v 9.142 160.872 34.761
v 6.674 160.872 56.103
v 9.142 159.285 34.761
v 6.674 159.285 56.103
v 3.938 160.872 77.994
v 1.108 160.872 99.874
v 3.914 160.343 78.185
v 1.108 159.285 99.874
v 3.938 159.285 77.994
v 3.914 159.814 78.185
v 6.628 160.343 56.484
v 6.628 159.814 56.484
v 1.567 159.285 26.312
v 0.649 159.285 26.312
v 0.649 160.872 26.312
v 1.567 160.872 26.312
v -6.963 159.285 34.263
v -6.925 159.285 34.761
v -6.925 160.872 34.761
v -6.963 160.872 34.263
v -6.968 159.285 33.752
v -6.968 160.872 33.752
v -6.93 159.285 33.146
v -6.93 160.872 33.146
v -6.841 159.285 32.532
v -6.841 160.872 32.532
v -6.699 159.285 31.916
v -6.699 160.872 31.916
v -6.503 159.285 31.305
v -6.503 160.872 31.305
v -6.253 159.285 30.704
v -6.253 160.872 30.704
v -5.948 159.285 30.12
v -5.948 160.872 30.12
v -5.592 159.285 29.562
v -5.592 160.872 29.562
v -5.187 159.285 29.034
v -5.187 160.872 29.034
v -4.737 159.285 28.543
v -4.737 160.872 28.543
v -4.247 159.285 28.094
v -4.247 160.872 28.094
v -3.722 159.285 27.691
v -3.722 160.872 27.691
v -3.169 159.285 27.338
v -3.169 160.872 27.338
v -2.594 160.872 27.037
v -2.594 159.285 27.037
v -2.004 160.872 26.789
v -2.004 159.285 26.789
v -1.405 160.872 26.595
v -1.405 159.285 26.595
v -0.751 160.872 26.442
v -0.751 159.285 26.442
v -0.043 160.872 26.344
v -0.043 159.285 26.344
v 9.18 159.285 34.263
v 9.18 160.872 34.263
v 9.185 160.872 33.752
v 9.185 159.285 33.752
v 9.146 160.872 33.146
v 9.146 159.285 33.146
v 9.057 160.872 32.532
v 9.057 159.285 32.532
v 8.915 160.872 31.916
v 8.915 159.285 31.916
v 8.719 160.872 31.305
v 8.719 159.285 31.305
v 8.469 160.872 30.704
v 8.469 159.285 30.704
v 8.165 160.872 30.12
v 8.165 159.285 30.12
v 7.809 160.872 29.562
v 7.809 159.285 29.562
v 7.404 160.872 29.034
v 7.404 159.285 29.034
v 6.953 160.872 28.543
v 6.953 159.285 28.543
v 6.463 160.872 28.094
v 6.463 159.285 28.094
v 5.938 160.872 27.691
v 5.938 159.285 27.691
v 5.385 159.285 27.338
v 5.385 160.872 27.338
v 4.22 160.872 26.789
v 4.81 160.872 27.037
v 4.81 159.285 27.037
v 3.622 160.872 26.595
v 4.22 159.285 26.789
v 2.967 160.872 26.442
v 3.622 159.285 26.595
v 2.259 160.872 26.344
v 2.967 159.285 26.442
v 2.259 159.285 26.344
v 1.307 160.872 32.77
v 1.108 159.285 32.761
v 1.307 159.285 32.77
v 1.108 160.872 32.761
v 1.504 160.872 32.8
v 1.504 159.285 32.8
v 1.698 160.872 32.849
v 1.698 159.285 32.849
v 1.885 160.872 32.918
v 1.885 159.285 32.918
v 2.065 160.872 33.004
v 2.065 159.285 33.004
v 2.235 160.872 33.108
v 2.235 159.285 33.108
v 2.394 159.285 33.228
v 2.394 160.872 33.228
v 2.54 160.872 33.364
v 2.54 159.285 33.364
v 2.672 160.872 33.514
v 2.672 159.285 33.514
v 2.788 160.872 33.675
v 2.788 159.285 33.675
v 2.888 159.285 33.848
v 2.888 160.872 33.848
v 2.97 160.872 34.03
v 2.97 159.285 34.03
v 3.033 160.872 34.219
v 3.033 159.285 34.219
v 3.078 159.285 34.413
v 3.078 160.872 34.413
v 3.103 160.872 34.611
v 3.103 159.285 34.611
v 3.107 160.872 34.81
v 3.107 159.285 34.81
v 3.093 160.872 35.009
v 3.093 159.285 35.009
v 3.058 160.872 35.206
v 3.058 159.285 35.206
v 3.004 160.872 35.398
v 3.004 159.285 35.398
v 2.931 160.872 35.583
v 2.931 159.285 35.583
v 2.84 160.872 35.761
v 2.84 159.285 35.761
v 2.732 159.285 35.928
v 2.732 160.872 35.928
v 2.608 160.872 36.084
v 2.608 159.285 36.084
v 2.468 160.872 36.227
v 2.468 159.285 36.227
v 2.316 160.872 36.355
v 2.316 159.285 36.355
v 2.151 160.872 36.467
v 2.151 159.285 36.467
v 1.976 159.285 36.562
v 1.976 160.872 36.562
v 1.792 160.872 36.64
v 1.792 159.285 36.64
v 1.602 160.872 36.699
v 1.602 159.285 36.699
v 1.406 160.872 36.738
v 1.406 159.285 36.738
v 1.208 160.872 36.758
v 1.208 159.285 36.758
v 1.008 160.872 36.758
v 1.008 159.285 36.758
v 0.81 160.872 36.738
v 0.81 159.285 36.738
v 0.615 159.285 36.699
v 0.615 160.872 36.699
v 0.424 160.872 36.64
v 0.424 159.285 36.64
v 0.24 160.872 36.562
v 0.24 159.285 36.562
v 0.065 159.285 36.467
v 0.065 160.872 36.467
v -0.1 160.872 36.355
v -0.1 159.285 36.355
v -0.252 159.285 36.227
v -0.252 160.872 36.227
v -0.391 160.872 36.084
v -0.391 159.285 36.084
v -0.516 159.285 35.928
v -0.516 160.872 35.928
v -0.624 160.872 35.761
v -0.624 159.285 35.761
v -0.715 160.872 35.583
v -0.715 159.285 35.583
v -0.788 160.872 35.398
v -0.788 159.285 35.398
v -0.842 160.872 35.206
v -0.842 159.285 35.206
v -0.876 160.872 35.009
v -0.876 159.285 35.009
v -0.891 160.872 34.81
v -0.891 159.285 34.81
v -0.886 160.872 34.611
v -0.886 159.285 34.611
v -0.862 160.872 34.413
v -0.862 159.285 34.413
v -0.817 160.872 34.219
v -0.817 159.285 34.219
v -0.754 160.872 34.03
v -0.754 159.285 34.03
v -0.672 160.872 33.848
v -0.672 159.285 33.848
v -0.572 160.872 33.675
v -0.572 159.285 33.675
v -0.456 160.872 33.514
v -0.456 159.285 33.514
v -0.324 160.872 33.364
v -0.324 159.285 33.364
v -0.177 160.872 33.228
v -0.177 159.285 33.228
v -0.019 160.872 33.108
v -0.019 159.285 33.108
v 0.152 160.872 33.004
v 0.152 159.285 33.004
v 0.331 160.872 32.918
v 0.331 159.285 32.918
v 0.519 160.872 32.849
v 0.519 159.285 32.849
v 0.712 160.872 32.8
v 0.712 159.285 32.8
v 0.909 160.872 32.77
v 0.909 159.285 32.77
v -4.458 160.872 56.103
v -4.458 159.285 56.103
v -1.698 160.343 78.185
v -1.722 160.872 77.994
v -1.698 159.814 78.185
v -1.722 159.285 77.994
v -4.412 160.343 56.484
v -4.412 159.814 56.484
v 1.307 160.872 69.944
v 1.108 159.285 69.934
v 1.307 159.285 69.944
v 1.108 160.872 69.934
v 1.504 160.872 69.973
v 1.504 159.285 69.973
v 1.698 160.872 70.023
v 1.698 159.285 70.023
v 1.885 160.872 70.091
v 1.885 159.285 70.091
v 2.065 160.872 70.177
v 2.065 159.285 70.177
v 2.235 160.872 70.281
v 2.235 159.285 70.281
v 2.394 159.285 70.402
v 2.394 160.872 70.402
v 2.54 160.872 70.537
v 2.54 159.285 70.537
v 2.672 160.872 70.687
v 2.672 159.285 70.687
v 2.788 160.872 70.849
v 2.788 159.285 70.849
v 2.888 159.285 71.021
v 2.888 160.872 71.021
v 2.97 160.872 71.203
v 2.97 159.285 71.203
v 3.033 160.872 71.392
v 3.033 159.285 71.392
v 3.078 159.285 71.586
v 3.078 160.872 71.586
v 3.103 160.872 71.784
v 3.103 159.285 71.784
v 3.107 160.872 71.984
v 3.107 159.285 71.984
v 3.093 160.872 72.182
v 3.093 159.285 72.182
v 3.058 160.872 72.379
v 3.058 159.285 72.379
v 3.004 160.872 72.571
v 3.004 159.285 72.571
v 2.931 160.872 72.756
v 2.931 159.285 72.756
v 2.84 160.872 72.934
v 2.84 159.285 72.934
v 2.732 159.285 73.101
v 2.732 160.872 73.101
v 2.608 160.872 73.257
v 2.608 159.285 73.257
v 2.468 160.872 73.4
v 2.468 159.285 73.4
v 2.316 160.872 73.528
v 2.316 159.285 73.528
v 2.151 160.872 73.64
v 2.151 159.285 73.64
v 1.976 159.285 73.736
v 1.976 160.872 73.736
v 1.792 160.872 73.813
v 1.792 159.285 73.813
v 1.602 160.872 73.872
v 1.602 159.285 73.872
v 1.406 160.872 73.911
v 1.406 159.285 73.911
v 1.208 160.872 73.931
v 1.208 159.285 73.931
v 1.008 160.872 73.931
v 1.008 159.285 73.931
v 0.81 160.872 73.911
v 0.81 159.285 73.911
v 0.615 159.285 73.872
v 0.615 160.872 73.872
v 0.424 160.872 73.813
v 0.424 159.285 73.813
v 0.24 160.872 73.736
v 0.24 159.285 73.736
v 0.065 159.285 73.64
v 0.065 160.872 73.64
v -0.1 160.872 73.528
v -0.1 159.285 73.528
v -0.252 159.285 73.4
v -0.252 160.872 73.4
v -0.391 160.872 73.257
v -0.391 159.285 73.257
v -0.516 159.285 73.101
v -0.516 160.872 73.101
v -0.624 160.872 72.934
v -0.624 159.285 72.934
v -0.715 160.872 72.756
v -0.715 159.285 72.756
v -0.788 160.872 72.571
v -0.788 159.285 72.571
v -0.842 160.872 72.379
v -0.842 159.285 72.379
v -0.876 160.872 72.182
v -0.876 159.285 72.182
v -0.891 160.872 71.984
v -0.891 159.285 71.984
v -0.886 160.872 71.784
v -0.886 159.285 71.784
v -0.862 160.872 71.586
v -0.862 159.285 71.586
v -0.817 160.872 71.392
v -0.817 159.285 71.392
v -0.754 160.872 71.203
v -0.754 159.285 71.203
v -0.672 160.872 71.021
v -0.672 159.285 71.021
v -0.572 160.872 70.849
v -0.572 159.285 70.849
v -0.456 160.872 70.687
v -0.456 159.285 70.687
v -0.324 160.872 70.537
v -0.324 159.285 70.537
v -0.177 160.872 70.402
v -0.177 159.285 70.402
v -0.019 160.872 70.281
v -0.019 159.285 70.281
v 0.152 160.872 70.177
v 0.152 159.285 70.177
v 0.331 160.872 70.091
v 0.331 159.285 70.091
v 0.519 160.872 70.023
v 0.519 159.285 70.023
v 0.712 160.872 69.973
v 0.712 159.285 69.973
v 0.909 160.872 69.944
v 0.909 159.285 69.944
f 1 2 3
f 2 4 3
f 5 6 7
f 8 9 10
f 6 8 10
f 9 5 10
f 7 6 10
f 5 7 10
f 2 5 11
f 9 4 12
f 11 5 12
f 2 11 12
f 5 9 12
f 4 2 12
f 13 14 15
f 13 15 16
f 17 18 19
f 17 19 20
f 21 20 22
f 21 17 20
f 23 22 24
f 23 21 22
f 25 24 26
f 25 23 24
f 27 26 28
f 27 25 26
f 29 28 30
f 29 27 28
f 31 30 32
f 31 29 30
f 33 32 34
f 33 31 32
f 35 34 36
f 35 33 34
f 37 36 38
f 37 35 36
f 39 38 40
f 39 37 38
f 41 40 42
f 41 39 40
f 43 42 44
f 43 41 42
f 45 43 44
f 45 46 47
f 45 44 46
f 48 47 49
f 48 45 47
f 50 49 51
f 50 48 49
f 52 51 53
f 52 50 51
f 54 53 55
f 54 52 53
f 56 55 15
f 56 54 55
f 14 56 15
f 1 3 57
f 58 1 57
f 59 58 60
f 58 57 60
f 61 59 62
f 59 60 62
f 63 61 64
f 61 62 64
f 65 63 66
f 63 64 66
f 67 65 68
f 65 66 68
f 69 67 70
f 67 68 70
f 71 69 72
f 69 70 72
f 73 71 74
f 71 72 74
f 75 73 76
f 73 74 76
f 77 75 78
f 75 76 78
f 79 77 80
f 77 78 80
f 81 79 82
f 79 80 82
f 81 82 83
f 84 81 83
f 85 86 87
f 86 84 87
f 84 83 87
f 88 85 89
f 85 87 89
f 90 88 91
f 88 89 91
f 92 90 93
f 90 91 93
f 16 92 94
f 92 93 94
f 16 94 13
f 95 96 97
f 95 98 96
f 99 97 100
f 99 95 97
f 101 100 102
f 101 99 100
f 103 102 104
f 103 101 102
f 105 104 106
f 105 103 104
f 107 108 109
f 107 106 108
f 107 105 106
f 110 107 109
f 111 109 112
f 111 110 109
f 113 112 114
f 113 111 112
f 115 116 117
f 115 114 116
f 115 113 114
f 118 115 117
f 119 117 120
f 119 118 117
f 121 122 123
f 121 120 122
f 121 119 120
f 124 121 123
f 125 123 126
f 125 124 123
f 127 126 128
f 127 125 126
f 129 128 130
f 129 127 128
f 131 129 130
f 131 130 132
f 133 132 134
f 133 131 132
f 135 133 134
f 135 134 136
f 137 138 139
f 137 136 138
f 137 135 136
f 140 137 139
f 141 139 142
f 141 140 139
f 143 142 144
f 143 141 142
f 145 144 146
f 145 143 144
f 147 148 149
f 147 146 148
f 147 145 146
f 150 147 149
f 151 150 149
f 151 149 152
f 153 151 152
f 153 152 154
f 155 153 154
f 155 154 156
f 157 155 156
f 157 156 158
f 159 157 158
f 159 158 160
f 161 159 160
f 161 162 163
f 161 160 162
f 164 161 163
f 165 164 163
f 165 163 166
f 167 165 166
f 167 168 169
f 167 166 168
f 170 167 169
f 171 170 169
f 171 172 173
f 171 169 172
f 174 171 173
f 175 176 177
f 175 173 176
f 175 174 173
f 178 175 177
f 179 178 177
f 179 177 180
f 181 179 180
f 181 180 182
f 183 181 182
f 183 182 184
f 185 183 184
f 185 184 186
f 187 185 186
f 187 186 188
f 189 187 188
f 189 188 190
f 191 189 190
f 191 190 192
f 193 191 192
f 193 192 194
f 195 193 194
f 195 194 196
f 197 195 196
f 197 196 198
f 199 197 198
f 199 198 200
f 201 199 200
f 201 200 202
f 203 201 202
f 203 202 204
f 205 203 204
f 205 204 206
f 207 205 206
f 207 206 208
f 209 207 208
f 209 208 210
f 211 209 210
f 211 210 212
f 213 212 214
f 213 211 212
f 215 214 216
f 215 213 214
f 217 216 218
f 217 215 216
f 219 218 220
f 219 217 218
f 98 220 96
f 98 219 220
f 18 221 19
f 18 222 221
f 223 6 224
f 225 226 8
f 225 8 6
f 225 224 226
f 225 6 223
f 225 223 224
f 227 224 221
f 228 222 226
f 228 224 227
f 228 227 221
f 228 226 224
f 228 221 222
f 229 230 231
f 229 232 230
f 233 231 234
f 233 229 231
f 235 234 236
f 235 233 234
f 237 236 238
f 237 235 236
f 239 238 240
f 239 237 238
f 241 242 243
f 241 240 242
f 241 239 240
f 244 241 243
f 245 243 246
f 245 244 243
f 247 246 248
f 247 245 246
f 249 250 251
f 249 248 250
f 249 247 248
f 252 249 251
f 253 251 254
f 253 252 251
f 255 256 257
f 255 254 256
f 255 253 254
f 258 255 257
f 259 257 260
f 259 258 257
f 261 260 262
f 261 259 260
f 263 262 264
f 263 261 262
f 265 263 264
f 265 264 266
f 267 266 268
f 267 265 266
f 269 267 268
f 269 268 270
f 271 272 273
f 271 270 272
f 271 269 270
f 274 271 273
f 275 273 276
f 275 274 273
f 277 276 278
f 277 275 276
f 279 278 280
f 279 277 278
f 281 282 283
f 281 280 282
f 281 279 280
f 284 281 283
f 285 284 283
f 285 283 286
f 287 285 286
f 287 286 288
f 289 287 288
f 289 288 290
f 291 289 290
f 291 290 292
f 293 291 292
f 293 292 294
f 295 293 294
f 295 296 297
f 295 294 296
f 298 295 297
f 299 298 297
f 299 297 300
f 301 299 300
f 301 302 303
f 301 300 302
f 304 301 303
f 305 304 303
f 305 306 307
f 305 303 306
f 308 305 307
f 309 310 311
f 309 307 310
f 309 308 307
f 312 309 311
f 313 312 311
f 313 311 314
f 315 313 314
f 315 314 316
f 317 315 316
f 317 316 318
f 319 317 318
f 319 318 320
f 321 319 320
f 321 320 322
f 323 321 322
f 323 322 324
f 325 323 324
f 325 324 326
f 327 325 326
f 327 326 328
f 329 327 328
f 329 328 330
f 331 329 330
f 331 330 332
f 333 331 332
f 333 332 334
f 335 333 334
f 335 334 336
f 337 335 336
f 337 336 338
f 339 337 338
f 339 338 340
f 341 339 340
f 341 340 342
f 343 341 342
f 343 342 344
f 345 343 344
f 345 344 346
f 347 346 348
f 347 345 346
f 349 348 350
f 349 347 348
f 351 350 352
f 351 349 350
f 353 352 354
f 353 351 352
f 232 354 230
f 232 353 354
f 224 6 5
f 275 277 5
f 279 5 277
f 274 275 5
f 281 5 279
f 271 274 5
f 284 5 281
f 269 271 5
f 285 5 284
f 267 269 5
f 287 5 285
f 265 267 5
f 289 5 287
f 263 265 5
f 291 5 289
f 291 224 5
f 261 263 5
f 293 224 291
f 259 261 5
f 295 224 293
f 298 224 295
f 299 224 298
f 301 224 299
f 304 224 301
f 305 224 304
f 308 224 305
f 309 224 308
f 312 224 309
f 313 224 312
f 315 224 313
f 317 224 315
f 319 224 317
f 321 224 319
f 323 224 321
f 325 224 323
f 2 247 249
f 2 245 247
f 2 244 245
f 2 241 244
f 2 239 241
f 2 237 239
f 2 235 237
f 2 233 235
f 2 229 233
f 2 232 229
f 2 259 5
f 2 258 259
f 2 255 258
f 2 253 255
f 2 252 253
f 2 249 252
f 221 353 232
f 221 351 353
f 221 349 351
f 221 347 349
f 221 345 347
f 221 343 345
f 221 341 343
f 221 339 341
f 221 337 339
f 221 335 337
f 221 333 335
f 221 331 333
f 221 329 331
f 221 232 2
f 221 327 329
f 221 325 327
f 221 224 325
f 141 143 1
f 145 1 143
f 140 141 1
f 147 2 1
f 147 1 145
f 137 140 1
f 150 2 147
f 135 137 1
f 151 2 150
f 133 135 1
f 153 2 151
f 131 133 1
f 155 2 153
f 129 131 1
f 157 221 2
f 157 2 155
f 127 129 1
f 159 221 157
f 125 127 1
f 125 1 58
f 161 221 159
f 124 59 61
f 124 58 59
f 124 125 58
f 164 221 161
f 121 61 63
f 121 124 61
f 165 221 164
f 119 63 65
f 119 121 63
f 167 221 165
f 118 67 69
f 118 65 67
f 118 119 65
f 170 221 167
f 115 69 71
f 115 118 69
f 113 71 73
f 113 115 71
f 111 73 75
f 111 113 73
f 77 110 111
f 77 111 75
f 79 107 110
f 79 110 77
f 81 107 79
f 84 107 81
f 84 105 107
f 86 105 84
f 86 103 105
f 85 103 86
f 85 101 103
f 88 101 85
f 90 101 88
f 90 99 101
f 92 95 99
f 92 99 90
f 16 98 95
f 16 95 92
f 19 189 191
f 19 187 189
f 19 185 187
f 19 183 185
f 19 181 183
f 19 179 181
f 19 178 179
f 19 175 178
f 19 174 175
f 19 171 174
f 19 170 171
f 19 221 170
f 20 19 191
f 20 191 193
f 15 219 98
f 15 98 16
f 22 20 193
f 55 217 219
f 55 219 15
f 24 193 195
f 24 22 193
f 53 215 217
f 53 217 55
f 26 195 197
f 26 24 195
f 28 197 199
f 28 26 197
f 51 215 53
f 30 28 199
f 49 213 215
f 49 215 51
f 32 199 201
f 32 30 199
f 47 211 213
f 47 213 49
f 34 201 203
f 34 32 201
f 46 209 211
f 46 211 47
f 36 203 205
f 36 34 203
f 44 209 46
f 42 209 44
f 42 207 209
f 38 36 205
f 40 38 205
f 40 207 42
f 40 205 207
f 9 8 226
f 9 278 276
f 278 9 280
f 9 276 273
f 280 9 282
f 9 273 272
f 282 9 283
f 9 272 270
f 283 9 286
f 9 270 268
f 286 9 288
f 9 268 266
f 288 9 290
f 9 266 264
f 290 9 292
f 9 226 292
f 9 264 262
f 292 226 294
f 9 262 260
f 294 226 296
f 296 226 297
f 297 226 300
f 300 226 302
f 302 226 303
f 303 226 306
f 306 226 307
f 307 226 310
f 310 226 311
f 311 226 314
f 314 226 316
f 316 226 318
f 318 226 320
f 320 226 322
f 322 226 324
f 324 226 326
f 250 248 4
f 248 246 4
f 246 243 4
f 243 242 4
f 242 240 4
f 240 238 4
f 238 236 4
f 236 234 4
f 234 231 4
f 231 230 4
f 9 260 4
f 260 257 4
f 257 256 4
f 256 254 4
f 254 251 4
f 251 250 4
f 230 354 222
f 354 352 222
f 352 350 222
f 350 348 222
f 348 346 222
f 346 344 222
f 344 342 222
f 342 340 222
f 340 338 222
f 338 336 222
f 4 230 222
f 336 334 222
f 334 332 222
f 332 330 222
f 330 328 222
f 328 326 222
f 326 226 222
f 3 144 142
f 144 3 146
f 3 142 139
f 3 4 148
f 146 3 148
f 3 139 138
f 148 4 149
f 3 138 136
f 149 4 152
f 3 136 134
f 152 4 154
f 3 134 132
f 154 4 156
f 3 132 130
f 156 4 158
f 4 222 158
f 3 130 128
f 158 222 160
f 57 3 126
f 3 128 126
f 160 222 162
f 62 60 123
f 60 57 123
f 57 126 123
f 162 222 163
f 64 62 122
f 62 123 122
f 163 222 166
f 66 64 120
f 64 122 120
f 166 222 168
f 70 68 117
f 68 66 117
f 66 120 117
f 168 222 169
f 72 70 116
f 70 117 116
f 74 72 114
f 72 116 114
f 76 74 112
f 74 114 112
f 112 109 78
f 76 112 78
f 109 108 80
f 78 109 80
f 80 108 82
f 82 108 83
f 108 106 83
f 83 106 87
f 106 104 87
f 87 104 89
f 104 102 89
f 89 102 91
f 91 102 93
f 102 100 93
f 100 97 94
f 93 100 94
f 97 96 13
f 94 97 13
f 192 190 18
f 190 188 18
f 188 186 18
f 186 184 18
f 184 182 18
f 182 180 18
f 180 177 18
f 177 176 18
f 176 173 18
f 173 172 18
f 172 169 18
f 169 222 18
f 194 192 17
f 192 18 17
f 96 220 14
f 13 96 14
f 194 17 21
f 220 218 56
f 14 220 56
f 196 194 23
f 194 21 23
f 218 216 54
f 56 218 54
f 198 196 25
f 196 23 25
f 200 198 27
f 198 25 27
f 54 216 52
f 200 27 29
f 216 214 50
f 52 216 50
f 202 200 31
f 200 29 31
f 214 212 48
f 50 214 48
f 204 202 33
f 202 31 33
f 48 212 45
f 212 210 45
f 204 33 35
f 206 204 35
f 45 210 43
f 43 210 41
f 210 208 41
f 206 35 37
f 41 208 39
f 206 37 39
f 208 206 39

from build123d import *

# Parameters (mm, degrees)
SKETCH1_R               = 1.984375
BOSS_EXTRUDE1_DEPTH     = 169.87266
SKETCH2_W               = 35.763807095
SKETCH2_H               = 22.705005105
CUT_EXTRUDE1_DEPTH      = 23.05812
CUT_EXTRUDE2_START      = -169.87266
SKETCH2_2_W             = 35.763807095
SKETCH2_2_H             = 22.705005105
CUT_EXTRUDE2_DEPTH      = 23.05812
FILLET1_R               = 7.62
CUT_EXTRUDE3_DEPTH      = 198.390942599
CUT_EXTRUDE3_DEPTH_BACK = 198.390942599
SKETCH6_R               = 2
CUT_EXTRUDE4_DEPTH      = 198.390942599
CUT_EXTRUDE4_DEPTH_BACK = 198.390942599
SKETCH7_W               = 96.266326783
SKETCH7_H               = 159.284833333
SKETCH7_H_2             = 9.000326667


with BuildPart() as part:
    # Sketch1 → Boss-Extrude1 (new body)
    with BuildSketch(Plane(origin=(0, 0, 0), x_dir=(1, 0, 0), z_dir=(0, 1, 0))):
        with BuildLine():
            Line((-9.955287346, -3.607451573), (-6.769721368, -3.607451573))
            Line((-6.769721368, -3.607451573), (8.985913589, -3.607451573))
            Line((8.985913589, -3.607451573), (12.171479568, -3.607451573))
            add(Edge.make_bspline(
                [(10.60289965, -20.752451573), (11.099968974, -15.730201571), (11.630563617, -10.016003166), (12.113997871, -4.296816952), (12.171479568, -3.607451573)],
                knots=[0.384969626, 0.384969626, 0.384969626, 0.384969626, 0.458108671, 0.468131593, 0.468131593, 0.468131593, 0.468131593], degree=3))
            add(Edge.make_bspline(
                [(1.108096111, -99.873778356), (4.527344744, -73.531764163), (7.9865599, -47.187219652), (10.60289965, -20.752451573)],
                knots=[0, 0, 0, 0, 0.384969626, 0.384969626, 0.384969626, 0.384969626], degree=3))
            add(Edge.make_bspline(
                [(1.108096111, -99.873778356), (-2.311152522, -73.531764163), (-5.770367679, -47.187219652), (-8.386707429, -20.752451573)],
                knots=[0, 0, 0, 0, 0.384969626, 0.384969626, 0.384969626, 0.384969626], degree=3))
            add(Edge.make_bspline(
                [(-8.386707429, -20.752451573), (-8.883776753, -15.730201571), (-9.414371396, -10.016003166), (-9.89780565, -4.296816952), (-9.955287346, -3.607451573)],
                knots=[0.384969626, 0.384969626, 0.384969626, 0.384969626, 0.458108671, 0.468131593, 0.468131593, 0.468131593, 0.468131593], degree=3))
        make_face()
        with Locations(Location((1.108108569, -11.326456678, 0), (0, 0, 270))):
            Circle(SKETCH1_R, mode=Mode.SUBTRACT)
    extrude(amount=BOSS_EXTRUDE1_DEPTH)

    # Sketch2 → Cut-Extrude1 (cut)
    with BuildSketch(Plane(origin=(0, 169.87266, 0), x_dir=(1, 0, 0), z_dir=(0, 1, 0))):
        with Locations((7.926616202, -14.959954125)):
            Rectangle(SKETCH2_W, SKETCH2_H)
    extrude(amount=-CUT_EXTRUDE1_DEPTH, mode=Mode.SUBTRACT)

    # Sketch2<2> → Cut-Extrude2 (cut)
    with BuildSketch(Plane(origin=(0, 169.87266, 0), x_dir=(1, 0, 0), z_dir=(0, 1, 0)).offset(CUT_EXTRUDE2_START)):
        with Locations((7.926616202, -14.959954125)):
            Rectangle(SKETCH2_2_W, SKETCH2_2_H)
    extrude(amount=CUT_EXTRUDE2_DEPTH, mode=Mode.SUBTRACT)

    # Fillet1
    fillet1_edges = [part.edges().sort_by_distance(p)[0] for p in [
        (-7.824155374, 11.52906, 26.312456678),
        (10.040347595, 11.52906, 26.312456678),
        (-9.955287346, 84.93633, 3.607451573),
        (12.171479568, 84.93633, 3.607451573),
        (-7.824155374, 158.3436, 26.312456678),
        (10.040347595, 158.3436, 26.312456678),
    ]]
    fillet(fillet1_edges, radius=FILLET1_R)

    # Sketch6 → Cut-Extrude3 (cut, two sides: drawn at the far end of the back side and taken through both)
    with BuildSketch(Plane.XZ.offset(-CUT_EXTRUDE3_DEPTH_BACK)):
        with Locations(Location((1.108096111, 71.933778356, 0), (0, 0, 270))):
            Circle(SKETCH6_R)
        with Locations(Location((1.108096111, 34.760552137, 0), (0, 0, 270))):
            Circle(SKETCH6_R)
    extrude(amount=CUT_EXTRUDE3_DEPTH + CUT_EXTRUDE3_DEPTH_BACK, mode=Mode.SUBTRACT)

    # Sketch7 → Cut-Extrude4 (cut, two sides: drawn at the far end of the back side and taken through both)
    with BuildSketch(Plane(origin=(0, 0, 0), x_dir=(0, 0, -1), z_dir=(1, 0, 0)).offset(-CUT_EXTRUDE4_DEPTH_BACK)):
        with Locations((-51.740614965, 79.642416667)):
            Rectangle(SKETCH7_W, SKETCH7_H)
        with Locations((-51.740614965, 165.372496667)):
            Rectangle(SKETCH7_W, SKETCH7_H_2)
    extrude(amount=CUT_EXTRUDE4_DEPTH + CUT_EXTRUDE4_DEPTH_BACK, mode=Mode.SUBTRACT)


solid = part.part
